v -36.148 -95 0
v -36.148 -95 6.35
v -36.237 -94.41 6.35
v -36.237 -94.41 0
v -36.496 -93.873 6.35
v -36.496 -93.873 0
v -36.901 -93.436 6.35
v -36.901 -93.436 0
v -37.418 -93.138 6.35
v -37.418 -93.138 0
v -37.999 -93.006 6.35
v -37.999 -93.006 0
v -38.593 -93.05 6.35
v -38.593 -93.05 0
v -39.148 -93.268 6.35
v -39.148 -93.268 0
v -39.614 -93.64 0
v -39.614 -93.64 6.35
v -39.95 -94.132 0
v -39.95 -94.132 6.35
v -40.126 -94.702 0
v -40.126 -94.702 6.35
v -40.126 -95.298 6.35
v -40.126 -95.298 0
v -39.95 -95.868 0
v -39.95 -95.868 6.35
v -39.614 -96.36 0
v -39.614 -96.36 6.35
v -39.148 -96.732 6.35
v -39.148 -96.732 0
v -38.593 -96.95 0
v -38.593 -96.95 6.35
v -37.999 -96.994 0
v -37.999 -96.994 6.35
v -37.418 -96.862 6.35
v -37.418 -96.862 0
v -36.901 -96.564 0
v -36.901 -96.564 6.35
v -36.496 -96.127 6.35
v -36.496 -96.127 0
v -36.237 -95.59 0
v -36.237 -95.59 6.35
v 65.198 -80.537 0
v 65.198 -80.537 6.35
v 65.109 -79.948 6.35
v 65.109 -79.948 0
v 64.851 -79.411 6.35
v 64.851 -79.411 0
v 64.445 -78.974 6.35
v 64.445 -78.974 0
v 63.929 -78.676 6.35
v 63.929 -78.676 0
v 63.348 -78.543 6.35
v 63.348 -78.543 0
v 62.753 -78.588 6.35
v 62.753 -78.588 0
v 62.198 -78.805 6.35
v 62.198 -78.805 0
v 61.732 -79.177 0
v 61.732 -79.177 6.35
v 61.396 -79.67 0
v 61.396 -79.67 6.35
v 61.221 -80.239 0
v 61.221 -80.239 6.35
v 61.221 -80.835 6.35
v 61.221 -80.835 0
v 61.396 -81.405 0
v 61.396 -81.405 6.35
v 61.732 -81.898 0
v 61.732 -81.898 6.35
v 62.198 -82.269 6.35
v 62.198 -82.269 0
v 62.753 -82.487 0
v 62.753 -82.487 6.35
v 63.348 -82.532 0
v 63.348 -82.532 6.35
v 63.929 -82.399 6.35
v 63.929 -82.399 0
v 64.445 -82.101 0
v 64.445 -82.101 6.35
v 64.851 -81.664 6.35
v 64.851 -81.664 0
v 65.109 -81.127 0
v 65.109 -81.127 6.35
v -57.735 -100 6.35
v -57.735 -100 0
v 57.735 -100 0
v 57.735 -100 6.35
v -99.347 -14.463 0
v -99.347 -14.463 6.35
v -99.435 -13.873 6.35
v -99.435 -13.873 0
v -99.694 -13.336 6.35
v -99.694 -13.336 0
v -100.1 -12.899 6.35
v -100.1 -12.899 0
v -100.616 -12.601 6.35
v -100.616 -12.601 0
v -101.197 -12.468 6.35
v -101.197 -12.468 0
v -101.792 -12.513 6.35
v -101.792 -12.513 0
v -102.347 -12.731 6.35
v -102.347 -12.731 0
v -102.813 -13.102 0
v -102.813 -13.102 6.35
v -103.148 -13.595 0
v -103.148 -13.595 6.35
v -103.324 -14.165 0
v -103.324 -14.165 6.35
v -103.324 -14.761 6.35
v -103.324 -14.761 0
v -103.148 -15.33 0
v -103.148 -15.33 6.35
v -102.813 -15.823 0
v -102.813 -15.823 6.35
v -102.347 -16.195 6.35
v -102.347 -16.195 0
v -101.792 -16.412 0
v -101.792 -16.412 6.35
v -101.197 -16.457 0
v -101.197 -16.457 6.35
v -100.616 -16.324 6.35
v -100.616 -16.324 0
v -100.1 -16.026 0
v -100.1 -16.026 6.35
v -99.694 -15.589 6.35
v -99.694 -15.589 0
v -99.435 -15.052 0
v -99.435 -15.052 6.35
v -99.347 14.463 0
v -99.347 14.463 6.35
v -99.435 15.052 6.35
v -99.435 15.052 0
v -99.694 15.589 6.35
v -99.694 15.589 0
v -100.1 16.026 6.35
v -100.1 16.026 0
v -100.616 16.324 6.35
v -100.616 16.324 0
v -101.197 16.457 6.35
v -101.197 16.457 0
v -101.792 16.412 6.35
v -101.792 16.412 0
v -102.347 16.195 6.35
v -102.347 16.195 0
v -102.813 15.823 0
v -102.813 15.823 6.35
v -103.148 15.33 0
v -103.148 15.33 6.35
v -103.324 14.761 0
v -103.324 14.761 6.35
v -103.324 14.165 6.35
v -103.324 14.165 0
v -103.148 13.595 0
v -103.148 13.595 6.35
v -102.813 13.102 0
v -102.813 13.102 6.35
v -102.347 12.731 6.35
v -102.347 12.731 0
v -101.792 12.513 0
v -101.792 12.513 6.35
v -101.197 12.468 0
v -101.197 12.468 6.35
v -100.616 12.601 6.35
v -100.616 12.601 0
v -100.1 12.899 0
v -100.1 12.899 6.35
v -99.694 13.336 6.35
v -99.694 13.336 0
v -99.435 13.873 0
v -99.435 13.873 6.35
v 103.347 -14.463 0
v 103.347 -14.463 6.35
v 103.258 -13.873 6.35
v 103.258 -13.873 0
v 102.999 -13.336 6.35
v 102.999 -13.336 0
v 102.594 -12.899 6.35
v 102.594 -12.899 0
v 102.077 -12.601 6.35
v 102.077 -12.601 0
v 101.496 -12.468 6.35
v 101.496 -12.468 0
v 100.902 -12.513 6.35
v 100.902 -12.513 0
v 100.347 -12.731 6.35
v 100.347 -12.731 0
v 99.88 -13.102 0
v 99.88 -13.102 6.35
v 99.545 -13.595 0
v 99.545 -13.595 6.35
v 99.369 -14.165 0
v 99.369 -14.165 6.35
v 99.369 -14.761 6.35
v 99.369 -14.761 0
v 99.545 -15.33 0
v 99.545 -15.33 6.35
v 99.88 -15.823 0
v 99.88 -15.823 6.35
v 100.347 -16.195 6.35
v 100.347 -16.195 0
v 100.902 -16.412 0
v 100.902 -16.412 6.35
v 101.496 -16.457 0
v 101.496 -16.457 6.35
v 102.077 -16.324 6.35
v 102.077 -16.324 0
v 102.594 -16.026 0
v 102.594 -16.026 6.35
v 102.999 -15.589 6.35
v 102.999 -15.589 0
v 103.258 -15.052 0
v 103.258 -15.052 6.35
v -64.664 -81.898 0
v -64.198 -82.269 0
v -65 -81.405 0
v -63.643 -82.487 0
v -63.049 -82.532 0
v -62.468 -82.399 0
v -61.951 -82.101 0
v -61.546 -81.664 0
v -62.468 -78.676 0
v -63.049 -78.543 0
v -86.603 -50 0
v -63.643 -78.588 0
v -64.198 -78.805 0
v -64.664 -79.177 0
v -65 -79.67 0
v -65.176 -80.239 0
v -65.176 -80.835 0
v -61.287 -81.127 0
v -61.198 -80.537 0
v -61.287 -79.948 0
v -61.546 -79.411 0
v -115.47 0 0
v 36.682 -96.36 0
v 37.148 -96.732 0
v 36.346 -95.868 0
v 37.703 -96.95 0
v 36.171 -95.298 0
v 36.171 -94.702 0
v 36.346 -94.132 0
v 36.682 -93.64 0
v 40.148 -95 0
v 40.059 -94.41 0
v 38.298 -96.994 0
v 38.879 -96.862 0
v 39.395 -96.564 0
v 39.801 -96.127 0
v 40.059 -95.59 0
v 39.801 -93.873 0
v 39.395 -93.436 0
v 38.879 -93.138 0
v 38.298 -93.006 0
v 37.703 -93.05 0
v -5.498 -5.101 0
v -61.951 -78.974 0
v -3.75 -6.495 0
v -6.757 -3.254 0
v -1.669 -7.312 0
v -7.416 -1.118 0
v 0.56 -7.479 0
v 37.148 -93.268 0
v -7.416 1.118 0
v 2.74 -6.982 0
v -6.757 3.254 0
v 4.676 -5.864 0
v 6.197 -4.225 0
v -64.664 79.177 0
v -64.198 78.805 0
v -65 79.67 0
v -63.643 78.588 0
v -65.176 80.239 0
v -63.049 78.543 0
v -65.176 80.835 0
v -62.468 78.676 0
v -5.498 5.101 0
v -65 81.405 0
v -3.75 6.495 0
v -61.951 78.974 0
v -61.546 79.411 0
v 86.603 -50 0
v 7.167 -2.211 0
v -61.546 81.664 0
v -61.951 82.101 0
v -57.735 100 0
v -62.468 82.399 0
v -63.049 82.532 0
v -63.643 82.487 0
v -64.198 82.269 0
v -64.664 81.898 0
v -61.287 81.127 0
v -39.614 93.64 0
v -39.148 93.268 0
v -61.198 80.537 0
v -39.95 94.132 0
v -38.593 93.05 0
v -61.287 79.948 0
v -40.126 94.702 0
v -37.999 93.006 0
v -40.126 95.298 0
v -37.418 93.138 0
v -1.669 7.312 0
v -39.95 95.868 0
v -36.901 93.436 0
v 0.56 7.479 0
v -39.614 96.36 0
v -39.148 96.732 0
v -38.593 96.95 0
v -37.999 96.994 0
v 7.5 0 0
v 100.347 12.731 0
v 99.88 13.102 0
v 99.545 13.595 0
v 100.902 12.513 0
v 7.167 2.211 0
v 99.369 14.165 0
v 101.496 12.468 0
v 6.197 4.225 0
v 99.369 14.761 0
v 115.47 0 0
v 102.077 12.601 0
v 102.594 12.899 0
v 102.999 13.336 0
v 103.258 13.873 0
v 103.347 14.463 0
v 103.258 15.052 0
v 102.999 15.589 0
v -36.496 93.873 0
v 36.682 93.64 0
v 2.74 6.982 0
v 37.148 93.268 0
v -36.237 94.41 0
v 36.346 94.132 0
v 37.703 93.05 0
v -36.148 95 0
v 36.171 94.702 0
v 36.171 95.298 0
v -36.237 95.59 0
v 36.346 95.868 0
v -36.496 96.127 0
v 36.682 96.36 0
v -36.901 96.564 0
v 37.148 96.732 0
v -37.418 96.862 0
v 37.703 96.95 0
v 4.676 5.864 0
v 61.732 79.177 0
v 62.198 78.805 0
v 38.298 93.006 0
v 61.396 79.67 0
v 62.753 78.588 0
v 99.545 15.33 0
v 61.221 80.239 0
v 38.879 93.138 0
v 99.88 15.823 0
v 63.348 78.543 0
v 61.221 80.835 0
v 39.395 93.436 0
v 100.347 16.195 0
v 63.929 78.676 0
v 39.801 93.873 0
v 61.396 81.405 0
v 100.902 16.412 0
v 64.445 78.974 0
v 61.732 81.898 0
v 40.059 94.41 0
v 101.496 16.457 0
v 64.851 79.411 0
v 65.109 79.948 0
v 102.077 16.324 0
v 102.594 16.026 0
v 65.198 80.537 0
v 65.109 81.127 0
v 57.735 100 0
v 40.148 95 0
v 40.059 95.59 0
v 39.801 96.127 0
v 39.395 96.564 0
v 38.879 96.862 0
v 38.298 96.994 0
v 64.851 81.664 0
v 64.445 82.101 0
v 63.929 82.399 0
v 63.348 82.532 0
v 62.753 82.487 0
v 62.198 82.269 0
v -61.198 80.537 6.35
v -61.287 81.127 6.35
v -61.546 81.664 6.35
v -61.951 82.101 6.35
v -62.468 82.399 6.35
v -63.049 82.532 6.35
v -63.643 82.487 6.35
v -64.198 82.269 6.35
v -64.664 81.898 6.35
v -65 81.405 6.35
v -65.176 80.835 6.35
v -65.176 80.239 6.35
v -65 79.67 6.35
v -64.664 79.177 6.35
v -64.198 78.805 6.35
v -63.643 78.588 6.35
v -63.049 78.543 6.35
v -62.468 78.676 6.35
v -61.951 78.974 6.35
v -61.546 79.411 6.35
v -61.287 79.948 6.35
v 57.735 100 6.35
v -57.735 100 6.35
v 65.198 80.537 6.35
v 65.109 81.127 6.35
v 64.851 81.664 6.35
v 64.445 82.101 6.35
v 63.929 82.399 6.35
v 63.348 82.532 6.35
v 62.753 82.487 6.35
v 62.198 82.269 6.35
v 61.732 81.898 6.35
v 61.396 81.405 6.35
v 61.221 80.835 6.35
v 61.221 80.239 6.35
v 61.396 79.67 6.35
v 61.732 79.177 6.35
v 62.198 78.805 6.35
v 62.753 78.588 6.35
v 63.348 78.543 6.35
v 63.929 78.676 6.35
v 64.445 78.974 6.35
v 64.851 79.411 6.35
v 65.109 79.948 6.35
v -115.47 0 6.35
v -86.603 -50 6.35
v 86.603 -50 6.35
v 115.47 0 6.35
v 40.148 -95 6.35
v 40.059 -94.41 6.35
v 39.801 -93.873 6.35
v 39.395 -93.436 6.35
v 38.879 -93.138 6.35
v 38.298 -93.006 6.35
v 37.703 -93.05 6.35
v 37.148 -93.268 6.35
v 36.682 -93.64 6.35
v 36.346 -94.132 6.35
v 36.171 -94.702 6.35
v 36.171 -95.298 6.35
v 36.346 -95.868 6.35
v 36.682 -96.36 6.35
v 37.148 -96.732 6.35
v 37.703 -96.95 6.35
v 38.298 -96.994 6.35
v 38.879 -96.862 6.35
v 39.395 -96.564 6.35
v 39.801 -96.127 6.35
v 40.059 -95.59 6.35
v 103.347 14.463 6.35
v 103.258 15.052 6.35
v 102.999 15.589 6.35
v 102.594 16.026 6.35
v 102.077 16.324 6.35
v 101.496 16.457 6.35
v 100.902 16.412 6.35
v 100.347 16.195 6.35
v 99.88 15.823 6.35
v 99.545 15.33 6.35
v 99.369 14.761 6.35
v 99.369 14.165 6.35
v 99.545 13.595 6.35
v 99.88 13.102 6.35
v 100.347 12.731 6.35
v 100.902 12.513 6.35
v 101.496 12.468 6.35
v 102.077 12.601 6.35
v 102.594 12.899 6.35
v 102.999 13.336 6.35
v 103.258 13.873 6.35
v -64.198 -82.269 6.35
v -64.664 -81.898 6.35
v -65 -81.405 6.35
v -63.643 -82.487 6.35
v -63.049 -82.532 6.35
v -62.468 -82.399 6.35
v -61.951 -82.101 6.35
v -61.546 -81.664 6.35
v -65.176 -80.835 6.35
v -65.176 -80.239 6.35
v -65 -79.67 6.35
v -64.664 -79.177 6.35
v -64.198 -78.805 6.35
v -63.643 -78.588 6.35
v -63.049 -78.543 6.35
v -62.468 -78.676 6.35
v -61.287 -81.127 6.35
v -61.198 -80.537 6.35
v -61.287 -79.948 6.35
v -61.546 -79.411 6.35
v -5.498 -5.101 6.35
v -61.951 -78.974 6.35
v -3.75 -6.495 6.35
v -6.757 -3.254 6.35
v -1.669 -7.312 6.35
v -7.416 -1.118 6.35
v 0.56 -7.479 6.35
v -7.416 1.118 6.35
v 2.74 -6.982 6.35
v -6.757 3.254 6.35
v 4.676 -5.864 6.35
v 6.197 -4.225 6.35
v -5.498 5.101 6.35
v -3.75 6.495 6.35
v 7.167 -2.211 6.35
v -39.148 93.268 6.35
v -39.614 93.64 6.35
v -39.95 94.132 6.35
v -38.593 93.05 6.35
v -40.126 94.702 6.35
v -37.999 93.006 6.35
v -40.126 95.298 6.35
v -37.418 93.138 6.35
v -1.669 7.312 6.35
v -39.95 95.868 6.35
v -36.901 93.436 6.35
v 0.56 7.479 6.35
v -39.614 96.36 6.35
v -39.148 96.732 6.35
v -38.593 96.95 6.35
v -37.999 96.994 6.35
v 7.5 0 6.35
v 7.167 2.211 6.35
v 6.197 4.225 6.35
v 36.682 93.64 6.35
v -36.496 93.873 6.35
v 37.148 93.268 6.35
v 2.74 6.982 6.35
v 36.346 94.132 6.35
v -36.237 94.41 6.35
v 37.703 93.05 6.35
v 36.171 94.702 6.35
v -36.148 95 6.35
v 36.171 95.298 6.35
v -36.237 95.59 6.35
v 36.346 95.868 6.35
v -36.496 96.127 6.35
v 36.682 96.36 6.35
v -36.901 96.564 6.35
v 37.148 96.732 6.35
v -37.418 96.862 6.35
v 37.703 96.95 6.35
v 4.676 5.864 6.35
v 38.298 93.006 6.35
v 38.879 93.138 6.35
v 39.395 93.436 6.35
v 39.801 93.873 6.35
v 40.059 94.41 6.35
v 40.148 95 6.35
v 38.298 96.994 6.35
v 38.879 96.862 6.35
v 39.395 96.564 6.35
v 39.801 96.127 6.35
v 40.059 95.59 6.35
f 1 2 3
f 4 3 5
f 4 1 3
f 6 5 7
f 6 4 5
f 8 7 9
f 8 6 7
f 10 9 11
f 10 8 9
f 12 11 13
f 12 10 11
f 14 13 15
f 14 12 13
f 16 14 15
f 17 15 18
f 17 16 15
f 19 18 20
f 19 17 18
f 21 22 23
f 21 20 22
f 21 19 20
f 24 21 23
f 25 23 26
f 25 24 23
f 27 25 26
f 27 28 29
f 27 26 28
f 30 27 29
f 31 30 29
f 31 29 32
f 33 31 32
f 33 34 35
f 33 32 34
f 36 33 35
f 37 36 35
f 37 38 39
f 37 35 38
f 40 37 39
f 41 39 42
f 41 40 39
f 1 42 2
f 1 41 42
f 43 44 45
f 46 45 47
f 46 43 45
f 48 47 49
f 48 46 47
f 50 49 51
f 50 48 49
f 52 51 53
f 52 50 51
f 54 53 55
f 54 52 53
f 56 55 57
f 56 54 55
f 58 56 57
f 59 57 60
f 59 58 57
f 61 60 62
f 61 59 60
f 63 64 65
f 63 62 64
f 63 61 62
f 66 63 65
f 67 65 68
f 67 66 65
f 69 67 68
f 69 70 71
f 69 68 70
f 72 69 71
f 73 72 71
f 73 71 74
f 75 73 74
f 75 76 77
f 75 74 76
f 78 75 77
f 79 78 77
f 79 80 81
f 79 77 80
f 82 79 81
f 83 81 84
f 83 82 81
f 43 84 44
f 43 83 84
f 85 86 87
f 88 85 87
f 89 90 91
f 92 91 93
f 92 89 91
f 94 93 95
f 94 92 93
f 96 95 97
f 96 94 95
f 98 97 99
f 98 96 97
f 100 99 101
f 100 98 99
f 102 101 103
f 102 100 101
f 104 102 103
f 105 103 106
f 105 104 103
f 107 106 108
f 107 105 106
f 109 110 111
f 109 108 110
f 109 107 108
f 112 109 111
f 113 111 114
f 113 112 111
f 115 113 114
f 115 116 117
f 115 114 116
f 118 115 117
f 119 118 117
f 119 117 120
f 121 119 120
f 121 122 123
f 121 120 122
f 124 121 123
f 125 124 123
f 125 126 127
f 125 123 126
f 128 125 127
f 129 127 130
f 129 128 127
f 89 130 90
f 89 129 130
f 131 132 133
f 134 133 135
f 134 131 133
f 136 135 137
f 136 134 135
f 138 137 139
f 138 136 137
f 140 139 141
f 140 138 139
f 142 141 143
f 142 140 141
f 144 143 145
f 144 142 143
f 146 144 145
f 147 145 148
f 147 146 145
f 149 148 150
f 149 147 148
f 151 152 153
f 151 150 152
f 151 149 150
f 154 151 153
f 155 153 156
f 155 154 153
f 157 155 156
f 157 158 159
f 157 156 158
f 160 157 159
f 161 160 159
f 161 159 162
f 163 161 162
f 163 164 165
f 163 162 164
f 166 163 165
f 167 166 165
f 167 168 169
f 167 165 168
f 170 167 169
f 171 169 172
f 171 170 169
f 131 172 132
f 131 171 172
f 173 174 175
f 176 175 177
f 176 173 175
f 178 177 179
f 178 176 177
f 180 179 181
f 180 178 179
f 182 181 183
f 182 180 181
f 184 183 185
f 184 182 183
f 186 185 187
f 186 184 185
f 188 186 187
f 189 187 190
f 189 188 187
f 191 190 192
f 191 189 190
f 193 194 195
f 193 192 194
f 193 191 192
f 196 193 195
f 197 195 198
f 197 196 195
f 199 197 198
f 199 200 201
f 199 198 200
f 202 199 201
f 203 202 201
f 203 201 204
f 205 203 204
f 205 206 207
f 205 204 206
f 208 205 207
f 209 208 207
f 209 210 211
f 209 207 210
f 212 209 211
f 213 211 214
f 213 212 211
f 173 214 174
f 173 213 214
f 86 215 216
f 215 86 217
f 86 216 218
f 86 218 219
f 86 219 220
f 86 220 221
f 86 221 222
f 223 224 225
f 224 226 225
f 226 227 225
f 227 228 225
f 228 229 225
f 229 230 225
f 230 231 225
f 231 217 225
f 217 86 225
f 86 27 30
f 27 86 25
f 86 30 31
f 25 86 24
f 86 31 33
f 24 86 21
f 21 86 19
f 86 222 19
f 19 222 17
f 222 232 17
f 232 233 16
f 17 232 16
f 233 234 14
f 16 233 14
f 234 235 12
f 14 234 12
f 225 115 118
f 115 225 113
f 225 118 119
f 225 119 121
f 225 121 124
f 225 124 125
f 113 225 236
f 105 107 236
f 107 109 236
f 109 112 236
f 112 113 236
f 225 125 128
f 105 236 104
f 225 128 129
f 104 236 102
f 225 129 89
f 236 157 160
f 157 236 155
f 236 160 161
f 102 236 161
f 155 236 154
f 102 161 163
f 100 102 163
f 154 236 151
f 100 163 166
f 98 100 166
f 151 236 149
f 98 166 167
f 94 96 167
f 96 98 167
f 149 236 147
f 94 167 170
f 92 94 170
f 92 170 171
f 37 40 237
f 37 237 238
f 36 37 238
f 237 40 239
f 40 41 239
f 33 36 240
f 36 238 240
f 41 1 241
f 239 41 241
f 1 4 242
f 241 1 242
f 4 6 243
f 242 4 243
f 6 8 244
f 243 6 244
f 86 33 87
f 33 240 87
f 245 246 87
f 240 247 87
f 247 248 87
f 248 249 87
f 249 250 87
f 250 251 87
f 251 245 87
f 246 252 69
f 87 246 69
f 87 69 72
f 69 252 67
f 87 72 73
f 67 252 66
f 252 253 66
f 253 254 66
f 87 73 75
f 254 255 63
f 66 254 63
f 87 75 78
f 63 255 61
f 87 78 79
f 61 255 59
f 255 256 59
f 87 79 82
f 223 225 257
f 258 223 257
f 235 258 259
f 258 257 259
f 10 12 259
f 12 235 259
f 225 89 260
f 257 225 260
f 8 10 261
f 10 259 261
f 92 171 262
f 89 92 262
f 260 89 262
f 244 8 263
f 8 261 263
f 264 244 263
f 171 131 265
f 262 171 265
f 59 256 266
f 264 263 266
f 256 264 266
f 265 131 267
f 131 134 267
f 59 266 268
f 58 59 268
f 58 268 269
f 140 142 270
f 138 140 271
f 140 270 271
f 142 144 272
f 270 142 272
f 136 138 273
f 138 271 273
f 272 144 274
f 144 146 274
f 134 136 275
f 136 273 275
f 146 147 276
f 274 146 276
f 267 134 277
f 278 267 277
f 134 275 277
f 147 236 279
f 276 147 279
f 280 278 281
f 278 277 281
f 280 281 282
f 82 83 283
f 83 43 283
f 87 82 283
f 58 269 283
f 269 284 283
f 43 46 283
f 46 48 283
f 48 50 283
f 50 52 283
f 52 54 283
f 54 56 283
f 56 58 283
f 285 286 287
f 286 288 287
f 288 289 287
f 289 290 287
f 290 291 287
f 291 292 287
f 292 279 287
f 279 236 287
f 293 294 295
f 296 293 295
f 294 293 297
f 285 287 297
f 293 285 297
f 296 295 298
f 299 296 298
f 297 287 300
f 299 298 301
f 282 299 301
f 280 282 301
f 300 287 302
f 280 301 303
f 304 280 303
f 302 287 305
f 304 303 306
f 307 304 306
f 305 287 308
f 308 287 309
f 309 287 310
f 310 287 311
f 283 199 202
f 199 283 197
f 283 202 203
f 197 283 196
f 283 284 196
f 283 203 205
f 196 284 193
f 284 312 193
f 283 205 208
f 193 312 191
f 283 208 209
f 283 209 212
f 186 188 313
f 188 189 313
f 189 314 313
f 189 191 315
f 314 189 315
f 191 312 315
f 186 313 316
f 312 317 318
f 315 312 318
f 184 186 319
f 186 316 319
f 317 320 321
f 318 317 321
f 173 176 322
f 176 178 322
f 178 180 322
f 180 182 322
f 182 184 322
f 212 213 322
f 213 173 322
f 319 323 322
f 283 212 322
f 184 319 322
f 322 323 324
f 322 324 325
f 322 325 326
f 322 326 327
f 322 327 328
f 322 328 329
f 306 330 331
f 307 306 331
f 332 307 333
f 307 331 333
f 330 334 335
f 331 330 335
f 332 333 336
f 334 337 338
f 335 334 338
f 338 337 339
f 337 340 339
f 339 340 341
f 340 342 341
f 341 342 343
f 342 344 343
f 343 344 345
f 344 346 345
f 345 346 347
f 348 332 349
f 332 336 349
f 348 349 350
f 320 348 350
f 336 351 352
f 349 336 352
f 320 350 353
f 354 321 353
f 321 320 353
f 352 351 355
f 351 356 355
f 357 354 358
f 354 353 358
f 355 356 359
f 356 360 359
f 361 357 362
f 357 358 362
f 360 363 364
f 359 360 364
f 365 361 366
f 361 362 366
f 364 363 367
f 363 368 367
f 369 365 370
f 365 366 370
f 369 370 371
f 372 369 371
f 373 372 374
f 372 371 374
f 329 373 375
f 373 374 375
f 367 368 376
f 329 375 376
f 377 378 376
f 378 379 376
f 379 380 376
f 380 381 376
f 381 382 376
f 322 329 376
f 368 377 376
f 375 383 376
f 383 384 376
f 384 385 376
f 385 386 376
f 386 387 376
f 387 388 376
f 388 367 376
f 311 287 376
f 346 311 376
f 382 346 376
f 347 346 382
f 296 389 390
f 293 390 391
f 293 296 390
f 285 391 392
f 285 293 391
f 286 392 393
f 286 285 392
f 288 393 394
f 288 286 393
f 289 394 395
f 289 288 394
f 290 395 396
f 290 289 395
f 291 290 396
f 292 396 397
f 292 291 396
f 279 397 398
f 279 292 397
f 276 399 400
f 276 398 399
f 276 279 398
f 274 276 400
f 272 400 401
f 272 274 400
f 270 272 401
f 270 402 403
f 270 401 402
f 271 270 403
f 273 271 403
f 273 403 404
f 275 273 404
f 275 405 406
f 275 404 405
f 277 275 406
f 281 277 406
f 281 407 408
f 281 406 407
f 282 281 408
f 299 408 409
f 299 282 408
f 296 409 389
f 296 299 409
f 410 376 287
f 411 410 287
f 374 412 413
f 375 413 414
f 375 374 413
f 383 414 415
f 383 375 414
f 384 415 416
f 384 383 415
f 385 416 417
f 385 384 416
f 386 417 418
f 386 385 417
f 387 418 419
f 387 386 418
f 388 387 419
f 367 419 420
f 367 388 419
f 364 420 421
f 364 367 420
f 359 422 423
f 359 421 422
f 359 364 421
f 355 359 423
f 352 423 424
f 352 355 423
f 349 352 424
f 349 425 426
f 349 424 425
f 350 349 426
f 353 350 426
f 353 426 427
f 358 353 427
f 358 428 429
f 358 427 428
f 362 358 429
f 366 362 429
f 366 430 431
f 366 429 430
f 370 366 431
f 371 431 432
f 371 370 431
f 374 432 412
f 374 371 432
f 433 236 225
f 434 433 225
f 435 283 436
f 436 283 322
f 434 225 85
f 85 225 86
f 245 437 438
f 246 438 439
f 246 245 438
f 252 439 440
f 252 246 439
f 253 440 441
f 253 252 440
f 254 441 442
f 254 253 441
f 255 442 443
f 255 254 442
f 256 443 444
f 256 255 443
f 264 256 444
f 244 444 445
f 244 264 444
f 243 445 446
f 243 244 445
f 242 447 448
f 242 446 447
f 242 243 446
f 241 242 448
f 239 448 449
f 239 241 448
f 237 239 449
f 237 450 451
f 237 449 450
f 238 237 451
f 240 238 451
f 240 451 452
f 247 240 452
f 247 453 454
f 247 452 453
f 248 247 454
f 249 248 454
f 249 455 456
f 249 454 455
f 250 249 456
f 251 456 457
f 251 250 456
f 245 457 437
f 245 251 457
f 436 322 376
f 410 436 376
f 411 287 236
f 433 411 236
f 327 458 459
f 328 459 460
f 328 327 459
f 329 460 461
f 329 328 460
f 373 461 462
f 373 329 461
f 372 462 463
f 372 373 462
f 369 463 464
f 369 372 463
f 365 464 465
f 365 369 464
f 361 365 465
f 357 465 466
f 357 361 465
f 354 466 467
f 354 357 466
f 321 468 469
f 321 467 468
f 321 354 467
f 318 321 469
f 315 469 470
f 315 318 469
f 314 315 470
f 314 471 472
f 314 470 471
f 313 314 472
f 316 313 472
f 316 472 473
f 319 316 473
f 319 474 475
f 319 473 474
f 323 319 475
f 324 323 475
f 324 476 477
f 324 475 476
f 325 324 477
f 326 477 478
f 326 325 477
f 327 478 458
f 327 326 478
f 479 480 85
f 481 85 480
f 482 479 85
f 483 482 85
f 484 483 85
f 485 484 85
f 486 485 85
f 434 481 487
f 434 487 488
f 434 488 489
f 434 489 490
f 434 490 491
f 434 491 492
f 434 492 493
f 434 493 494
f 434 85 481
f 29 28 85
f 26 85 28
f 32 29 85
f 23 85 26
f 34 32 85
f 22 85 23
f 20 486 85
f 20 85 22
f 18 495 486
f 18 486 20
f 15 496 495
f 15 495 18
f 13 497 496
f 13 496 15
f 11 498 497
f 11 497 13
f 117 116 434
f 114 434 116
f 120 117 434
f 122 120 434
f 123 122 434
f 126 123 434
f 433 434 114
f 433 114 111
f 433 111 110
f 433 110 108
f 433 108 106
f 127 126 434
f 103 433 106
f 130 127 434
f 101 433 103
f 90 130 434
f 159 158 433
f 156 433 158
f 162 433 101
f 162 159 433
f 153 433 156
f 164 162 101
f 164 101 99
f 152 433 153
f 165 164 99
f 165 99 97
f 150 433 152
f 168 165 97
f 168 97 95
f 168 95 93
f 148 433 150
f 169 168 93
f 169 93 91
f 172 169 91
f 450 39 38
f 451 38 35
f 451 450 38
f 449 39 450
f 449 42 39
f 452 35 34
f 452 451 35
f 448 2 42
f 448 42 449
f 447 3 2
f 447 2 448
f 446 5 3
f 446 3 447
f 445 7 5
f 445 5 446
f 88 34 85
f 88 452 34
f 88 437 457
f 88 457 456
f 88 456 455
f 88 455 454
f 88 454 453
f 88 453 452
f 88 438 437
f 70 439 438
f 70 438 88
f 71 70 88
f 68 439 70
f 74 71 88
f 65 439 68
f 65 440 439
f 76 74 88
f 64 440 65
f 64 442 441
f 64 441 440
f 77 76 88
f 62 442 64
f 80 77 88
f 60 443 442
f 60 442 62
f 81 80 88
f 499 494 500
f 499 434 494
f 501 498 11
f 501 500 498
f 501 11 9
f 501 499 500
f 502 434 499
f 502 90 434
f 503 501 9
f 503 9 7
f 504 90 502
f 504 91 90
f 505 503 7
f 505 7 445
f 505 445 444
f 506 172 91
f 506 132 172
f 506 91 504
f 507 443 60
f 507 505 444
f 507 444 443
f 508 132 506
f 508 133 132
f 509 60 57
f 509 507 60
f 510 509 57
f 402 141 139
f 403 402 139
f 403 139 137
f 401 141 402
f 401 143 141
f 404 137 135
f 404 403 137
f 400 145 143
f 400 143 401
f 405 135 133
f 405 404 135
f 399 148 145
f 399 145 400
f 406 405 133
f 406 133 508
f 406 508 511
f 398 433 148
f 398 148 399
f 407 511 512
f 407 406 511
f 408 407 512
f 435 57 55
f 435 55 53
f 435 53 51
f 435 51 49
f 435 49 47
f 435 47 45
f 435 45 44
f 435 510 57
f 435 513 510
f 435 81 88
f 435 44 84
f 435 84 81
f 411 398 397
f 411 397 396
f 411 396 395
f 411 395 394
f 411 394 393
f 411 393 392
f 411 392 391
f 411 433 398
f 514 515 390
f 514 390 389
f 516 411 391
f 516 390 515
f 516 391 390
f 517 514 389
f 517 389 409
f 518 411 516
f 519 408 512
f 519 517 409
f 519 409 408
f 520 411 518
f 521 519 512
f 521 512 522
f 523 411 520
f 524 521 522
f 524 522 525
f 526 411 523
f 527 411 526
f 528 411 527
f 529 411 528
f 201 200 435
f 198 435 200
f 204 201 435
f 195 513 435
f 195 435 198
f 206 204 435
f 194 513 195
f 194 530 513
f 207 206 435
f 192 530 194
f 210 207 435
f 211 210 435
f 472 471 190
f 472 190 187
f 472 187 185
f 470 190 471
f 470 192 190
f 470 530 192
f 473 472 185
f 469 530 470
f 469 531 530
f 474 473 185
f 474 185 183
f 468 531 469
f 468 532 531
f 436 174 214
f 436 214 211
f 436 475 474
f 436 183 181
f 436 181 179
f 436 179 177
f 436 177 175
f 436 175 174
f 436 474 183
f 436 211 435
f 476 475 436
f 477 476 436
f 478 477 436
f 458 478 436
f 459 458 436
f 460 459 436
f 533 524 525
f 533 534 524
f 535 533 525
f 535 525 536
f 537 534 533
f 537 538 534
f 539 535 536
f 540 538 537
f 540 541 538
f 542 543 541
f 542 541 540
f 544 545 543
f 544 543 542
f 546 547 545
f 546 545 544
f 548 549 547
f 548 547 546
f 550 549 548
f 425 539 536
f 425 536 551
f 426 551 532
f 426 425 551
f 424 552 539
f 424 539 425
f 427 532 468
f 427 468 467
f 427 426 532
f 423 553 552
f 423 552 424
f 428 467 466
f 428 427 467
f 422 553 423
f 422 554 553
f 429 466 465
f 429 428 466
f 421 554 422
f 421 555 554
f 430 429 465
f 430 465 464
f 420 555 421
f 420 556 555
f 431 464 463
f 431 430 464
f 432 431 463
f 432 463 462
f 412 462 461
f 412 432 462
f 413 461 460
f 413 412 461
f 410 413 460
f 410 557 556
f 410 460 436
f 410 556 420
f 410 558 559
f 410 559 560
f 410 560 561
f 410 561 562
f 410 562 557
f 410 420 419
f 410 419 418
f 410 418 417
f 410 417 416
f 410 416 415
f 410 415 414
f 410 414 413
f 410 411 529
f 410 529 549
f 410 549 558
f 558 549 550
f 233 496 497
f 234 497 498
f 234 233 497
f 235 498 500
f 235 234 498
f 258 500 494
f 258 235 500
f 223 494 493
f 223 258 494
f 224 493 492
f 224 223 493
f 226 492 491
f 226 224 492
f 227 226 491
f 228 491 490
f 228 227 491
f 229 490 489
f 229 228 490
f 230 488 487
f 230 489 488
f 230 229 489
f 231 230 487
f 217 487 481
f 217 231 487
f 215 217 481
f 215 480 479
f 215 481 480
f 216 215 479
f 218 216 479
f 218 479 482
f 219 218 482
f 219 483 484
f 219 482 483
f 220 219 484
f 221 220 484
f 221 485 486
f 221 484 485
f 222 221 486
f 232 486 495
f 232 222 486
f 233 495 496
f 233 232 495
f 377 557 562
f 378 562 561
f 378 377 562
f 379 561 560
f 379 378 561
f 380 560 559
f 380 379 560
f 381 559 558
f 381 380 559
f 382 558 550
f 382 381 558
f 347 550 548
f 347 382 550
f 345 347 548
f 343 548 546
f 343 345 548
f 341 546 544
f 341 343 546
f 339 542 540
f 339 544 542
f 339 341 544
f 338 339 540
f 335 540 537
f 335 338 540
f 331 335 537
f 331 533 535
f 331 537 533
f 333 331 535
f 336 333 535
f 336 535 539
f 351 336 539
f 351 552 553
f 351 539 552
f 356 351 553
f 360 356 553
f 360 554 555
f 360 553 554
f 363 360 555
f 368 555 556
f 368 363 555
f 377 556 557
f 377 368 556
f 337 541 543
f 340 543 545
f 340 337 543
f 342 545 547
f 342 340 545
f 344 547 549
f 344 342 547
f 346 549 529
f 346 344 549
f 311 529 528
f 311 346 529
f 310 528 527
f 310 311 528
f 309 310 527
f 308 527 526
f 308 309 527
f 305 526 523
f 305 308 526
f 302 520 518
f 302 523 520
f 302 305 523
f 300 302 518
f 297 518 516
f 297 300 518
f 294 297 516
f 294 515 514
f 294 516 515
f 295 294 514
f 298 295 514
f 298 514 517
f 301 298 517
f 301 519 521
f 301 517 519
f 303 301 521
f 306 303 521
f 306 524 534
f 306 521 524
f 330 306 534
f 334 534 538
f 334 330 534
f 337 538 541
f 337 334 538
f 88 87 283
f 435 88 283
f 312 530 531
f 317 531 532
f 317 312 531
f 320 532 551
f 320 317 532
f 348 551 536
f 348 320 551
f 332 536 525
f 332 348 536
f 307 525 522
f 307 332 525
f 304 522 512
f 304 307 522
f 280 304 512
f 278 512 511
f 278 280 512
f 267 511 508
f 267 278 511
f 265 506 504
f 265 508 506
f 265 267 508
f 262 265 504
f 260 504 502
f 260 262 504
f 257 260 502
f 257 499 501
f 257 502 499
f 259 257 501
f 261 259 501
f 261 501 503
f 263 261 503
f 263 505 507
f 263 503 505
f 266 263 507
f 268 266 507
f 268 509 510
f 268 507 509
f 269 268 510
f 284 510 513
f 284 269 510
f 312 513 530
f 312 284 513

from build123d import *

# Parameters (mm, degrees)
F1_DEPTH = 6.35
F2_R     = 2
F3_DEPTH = 20000
F4_R     = 7.5
F5_DEPTH = 55.3


with BuildPart() as f1:
    # F0 (on Top) → F1 (new body)
    with BuildSketch(Plane.XY):
        with BuildLine():
            ThreePointArc((86.6025406101, -49.9999995987), (96.5925826889, -25.8819042865), (100, 0))
            ThreePointArc((100, 0), (96.5925827815, 25.8819039408), (86.602540968, 49.9999989789))
            ThreePointArc((86.602540968, 49.9999989789), (50.0000005105, 86.6025400837), (0, 100))
            ThreePointArc((0, 100), (-50.0000005105, 86.6025400837), (-86.602540968, 49.9999989789))
            ThreePointArc((-86.602540968, 49.9999989789), (-100, 8.447e-07), (-86.6025418126, -49.9999975159))
            ThreePointArc((-86.6025418126, -49.9999975159), (-50.000001242, -86.6025396613), (0, -100))
            ThreePointArc((0, -100), (50.0000002007, -86.6025402626), (86.6025406101, -49.9999995987))
        make_face()
        with BuildLine():
            ThreePointArc((86.602540968, 49.9999989789), (96.5925827815, 25.8819039408), (100, 0))
            ThreePointArc((100, 0), (96.5925826889, -25.8819042865), (86.6025406101, -49.9999995987))
            Line((86.6025406101, -49.9999995987), (115.4700538379, 0))
            Line((115.4700538379, 0), (86.602540968, 49.9999989789))
        make_face()
        with BuildLine():
            ThreePointArc((0, 100), (50.0000005105, 86.6025400837), (86.602540968, 49.9999989789))
            Line((86.602540968, 49.9999989789), (57.735026919, 100))
            Line((57.735026919, 100), (0, 100))
        make_face()
        with BuildLine():
            Line((57.735026919, -100), (86.6025406101, -49.9999995987))
            ThreePointArc((86.6025406101, -49.9999995987), (50.0000002007, -86.6025402626), (0, -100))
            Line((0, -100), (57.735026919, -100))
        make_face()
        with BuildLine():
            ThreePointArc((-86.602540968, 49.9999989789), (-50.0000005105, 86.6025400837), (0, 100))
            Line((0, 100), (-57.735026919, 100))
            Line((-57.735026919, 100), (-86.602540968, 49.9999989789))
        make_face()
        with BuildLine():
            Line((-57.735026919, -100), (0, -100))
            ThreePointArc((0, -100), (-50.000001242, -86.6025396613), (-86.6025418126, -49.9999975159))
            Line((-86.6025418126, -49.9999975159), (-57.735026919, -100))
        make_face()
        with BuildLine():
            ThreePointArc((-86.6025418126, -49.9999975159), (-100, 8.447e-07), (-86.602540968, 49.9999989789))
            Line((-86.602540968, 49.9999989789), (-115.4700538379, 0))
            Line((-115.4700538379, 0), (-86.6025418126, -49.9999975159))
        make_face()
    extrude(amount=F1_DEPTH)

    # F2 (on Top) → F3 (cut)
    with BuildSketch(Plane.XY):
        with Locations((38.148275573, 95)):
            Circle(F2_R)
        with Locations((-38.148275573, 95)):
            Circle(F2_R)
        with Locations((-63.198275573, 80.5373757568)):
            Circle(F2_R)
        with Locations((-101.346551146, 14.4626242432)):
            Circle(F2_R)
        with Locations((-101.346551146, -14.4626242432)):
            Circle(F2_R)
        with Locations((-63.198275573, -80.5373757568)):
            Circle(F2_R)
        with Locations((-38.148275573, -95)):
            Circle(F2_R)
        with Locations((38.148275573, -95)):
            Circle(F2_R)
        with Locations((63.198275573, -80.5373757568)):
            Circle(F2_R)
        with Locations((101.346551146, -14.4626242432)):
            Circle(F2_R)
        with Locations((101.346551146, 14.4626242432)):
            Circle(F2_R)
        with Locations((63.198275573, 80.5373757568)):
            Circle(F2_R)
    extrude(amount=F3_DEPTH, mode=Mode.SUBTRACT)

    # F4 (on Top) → F5 (cut)
    with BuildSketch(Plane.XY):
        Circle(F4_R)
    extrude(amount=F5_DEPTH, mode=Mode.SUBTRACT)


solid = f1.part
